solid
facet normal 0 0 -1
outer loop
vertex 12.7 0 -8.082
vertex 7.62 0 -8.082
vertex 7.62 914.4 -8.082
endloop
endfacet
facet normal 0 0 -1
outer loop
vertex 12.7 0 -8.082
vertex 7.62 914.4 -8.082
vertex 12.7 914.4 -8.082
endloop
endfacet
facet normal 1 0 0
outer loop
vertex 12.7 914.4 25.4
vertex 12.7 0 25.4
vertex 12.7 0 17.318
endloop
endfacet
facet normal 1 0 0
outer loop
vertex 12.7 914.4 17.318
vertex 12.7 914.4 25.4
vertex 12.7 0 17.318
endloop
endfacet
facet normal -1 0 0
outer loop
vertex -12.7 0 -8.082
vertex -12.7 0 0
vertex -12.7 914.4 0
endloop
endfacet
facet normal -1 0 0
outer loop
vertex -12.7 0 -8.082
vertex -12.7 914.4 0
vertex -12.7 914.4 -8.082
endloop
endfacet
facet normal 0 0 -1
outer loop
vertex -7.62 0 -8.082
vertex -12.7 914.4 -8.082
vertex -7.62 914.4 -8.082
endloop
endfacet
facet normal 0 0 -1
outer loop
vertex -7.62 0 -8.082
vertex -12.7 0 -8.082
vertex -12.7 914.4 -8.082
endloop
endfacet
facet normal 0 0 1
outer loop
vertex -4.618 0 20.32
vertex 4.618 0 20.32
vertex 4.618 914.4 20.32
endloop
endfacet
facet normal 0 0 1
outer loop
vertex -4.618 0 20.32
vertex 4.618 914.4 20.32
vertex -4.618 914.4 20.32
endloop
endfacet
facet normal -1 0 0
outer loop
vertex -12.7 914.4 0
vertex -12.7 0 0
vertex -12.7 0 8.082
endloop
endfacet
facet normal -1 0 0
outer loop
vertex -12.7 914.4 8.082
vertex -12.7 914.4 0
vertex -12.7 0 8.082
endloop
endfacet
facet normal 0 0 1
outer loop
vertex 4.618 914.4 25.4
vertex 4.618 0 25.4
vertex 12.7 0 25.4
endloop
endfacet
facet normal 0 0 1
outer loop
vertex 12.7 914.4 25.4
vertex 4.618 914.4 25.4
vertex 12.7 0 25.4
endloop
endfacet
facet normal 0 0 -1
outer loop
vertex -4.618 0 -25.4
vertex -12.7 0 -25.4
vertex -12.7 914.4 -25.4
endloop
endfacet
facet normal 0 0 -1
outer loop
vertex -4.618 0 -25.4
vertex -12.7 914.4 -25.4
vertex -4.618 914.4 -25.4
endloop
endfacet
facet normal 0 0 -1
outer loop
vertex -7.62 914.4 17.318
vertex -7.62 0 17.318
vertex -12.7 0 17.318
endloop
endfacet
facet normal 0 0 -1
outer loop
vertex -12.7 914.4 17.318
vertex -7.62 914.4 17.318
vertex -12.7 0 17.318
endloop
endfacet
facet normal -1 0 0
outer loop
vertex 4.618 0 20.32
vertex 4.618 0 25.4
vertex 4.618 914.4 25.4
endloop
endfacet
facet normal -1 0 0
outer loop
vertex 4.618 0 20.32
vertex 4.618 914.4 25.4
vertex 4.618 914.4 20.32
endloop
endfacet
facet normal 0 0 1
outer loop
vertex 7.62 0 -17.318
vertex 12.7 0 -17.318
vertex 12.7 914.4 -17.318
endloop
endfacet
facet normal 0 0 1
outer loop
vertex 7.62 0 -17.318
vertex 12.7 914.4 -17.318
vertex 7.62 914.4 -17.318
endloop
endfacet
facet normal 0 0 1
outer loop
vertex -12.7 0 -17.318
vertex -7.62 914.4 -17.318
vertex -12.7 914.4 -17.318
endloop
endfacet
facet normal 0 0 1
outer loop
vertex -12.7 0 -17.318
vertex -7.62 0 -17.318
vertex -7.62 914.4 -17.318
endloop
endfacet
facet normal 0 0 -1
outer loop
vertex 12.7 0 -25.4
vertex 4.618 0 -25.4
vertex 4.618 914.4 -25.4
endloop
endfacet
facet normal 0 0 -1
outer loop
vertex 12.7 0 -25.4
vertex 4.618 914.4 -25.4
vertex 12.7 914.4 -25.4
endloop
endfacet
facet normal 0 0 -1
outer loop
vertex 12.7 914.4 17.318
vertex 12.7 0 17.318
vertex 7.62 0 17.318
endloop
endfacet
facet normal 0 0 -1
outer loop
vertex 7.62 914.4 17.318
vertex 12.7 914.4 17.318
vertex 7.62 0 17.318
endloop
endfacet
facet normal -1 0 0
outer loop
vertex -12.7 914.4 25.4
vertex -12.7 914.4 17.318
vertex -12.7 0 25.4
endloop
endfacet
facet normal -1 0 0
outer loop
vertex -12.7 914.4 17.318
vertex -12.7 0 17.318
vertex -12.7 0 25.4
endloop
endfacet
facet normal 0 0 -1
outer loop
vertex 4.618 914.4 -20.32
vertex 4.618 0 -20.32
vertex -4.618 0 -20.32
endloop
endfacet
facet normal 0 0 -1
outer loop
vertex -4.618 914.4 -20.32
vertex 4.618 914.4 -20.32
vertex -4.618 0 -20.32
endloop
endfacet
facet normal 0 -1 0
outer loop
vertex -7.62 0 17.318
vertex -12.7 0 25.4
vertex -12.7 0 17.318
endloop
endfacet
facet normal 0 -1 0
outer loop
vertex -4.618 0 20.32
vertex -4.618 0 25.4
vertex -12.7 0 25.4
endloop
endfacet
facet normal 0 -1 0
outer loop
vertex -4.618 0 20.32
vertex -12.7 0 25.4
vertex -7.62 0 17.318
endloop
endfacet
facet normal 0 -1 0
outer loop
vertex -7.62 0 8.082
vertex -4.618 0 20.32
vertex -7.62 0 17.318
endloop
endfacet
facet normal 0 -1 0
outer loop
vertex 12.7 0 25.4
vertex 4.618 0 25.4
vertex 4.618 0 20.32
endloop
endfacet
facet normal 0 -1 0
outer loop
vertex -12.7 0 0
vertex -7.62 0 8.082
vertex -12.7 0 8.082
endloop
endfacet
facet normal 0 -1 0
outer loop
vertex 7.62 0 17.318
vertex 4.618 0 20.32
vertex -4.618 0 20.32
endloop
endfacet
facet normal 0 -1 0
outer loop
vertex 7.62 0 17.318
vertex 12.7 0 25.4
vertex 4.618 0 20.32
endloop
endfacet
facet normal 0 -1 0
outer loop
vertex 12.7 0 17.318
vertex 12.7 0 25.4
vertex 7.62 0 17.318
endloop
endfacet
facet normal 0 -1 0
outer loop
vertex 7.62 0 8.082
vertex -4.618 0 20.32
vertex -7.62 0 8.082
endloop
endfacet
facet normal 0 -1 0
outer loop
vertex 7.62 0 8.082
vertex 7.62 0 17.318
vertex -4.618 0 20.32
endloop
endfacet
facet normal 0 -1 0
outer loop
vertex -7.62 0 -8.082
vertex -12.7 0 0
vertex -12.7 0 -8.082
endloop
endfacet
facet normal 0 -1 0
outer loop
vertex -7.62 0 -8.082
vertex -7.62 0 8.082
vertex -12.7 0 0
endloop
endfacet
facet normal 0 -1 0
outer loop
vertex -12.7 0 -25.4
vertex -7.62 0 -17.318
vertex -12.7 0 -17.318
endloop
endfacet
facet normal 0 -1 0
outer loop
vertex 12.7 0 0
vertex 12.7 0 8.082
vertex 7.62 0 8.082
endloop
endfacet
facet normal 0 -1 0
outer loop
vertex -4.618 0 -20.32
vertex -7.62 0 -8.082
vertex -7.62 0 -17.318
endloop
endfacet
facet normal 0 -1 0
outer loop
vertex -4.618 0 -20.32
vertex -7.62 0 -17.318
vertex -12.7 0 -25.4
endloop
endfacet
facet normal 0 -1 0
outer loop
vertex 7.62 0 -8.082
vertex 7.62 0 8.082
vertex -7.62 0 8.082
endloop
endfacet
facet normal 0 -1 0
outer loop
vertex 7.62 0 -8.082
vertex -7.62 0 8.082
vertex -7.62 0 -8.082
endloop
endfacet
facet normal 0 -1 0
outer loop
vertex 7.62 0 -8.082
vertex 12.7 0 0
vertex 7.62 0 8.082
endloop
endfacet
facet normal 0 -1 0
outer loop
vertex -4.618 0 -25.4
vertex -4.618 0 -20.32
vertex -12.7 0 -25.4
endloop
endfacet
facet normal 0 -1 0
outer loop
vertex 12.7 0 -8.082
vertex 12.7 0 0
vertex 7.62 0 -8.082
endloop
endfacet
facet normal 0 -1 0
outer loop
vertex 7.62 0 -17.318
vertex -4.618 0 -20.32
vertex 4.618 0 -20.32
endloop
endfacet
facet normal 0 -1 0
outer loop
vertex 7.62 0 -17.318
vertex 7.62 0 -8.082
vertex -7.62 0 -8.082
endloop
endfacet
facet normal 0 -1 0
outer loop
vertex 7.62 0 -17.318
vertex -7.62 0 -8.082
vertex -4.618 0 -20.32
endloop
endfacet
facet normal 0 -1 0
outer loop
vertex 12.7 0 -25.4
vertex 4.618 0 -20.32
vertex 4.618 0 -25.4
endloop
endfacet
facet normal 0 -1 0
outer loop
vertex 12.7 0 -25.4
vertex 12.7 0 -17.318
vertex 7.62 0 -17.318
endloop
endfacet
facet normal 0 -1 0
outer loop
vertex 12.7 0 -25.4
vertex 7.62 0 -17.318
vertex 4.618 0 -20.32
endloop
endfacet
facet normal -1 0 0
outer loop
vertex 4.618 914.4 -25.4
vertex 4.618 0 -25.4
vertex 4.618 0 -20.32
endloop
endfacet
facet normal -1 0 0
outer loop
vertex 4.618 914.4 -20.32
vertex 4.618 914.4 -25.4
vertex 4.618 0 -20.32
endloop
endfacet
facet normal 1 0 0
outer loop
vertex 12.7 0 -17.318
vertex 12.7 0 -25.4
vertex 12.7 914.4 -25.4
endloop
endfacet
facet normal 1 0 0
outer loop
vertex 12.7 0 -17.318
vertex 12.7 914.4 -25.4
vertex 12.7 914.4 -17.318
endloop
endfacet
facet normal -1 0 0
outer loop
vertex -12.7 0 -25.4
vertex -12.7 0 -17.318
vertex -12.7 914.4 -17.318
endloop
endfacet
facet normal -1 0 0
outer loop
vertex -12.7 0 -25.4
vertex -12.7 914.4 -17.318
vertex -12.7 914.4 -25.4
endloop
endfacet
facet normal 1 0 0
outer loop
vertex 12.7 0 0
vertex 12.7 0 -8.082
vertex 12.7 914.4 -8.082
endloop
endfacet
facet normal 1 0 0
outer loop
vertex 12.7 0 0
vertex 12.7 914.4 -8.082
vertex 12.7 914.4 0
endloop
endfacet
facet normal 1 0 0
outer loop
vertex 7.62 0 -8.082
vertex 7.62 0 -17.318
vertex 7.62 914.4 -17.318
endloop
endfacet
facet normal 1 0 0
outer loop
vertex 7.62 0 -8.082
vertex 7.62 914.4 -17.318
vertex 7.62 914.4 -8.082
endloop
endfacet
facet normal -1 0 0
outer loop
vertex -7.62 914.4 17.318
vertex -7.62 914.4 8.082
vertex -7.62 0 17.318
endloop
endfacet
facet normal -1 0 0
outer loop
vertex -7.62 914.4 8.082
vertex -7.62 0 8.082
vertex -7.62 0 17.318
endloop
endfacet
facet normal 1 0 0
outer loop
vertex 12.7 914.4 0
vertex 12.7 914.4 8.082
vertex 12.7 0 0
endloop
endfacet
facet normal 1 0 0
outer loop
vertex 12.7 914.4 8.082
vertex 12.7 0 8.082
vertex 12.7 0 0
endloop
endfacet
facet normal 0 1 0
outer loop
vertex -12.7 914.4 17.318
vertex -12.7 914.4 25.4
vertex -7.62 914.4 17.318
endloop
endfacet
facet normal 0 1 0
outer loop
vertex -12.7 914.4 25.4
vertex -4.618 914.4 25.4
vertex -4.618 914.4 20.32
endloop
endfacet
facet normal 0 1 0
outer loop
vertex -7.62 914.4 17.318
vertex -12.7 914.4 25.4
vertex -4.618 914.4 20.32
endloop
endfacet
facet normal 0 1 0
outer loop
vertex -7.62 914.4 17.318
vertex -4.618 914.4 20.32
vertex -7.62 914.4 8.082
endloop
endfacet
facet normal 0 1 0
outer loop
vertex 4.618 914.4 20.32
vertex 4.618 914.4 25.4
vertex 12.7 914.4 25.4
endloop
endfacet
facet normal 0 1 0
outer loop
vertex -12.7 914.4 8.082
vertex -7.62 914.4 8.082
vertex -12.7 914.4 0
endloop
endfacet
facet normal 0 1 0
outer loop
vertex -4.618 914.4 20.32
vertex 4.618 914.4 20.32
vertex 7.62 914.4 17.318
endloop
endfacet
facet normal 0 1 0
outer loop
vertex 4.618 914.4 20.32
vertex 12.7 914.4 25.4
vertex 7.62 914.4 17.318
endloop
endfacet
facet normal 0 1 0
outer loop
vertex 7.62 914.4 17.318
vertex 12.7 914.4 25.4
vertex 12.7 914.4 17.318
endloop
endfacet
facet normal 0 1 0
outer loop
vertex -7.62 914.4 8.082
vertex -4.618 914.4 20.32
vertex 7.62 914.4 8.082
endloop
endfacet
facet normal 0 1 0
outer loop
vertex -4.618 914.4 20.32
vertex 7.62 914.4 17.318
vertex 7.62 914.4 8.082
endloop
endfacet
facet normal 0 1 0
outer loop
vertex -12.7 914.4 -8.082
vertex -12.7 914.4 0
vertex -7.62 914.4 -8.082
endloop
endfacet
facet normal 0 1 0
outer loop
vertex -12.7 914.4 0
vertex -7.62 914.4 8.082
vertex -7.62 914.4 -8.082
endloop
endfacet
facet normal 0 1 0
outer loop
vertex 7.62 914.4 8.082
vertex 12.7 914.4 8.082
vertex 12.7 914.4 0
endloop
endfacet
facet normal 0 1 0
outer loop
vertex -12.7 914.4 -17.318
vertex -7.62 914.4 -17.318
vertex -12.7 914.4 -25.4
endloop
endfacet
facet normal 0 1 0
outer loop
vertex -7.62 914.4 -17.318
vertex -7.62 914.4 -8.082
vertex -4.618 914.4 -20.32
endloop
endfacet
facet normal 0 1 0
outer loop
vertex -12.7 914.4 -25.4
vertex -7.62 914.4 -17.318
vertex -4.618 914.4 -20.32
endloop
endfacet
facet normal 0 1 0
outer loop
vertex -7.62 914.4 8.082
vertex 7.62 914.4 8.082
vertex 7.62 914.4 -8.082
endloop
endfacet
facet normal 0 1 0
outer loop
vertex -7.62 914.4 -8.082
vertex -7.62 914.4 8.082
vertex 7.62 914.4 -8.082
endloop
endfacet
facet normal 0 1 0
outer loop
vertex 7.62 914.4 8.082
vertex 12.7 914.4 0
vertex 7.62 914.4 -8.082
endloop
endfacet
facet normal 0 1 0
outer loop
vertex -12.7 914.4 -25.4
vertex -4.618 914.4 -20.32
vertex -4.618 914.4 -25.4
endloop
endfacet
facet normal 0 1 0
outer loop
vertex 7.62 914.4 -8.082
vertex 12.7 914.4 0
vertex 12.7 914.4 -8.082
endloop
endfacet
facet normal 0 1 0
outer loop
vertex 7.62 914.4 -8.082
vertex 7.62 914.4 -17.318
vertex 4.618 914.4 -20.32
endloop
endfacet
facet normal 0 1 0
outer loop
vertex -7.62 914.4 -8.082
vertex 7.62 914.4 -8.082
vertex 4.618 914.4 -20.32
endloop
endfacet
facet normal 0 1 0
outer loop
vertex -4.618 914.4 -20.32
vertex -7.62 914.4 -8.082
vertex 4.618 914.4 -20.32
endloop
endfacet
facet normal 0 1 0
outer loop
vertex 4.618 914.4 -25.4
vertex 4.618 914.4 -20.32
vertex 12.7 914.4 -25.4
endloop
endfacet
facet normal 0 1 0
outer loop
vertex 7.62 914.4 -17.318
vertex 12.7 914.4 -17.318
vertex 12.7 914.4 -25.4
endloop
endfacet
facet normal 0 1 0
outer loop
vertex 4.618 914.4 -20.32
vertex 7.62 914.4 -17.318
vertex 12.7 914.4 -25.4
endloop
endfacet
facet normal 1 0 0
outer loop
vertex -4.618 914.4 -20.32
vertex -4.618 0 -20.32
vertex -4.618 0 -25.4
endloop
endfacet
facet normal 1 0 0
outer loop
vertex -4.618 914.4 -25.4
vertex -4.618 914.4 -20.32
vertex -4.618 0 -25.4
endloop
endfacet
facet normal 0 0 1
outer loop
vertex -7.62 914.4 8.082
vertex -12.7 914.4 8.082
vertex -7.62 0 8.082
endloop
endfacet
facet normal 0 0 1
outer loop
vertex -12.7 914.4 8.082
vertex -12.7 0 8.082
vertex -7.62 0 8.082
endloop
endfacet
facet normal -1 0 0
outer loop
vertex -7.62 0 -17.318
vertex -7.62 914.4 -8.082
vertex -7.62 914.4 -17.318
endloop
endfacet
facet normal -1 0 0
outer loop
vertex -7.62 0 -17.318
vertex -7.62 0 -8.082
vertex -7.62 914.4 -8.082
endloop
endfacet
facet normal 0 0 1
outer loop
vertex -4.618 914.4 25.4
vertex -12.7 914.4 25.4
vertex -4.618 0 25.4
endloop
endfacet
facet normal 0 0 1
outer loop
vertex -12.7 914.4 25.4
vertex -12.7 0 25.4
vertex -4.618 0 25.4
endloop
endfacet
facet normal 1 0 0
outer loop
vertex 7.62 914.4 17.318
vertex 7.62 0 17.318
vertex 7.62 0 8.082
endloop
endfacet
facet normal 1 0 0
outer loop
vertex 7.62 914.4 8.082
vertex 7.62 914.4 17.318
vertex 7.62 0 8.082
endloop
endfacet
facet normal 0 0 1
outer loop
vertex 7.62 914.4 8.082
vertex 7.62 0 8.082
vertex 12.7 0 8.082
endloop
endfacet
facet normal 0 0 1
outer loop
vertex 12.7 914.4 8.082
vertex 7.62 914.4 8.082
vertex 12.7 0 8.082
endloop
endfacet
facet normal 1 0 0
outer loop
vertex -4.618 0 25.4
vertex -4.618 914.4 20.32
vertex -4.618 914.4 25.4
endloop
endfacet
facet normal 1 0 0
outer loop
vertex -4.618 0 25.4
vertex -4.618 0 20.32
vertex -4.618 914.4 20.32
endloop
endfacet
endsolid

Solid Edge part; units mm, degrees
sketch "Sketch1" plane through (0, 0, 0) normal (0, -1, 0) x (1, 0, 0)
  line L0 (-7.62, -8.0821) -> (-7.62, -17.3179)
  line L1 (-7.62, -17.3179) -> (-12.7, -17.3179)
  line L2 (-12.7, -17.3179) -> (-12.7, -25.4)
  line L3 (-12.7, -25.4) -> (-4.6179, -25.4)
  line L4 (-4.6179, -20.32) -> (-4.6179, -25.4)
  line L5 (4.6179, -20.32) -> (-4.6179, -20.32)
  line L6 (4.6179, -25.4) -> (4.6179, -20.32)
  line L7 (4.6179, -25.4) -> (12.7, -25.4)
  line L8 (12.7, -25.4) -> (12.7, -17.3179)
  line L9 (12.7, -17.3179) -> (7.62, -17.3179)
  line L10 (7.62, -17.3179) -> (7.62, -8.0821)
  line L11 (7.62, -8.0821) -> (12.7, -8.0821)
  line L12 (12.7, -8.0821) -> (12.7, 0)
  line L13 (12.7, 8.0821) -> (12.7, 0)
  line L14 (7.62, 8.0821) -> (12.7, 8.0821)
  line L15 (7.62, 17.3179) -> (7.62, 8.0821)
  line L16 (12.7, 17.3179) -> (7.62, 17.3179)
  line L17 (12.7, 25.4) -> (12.7, 17.3179)
  line L18 (4.6179, 25.4) -> (12.7, 25.4)
  line L19 (4.6179, 25.4) -> (4.6179, 20.32)
  line L20 (4.6179, 20.32) -> (-4.6179, 20.32)
  line L21 (-4.6179, 20.32) -> (-4.6179, 25.4)
  line L22 (-12.7, 25.4) -> (-4.6179, 25.4)
  line L23 (-12.7, 17.3179) -> (-12.7, 25.4)
  line L24 (-7.62, 17.3179) -> (-12.7, 17.3179)
  line L25 (-7.62, 8.0821) -> (-7.62, 17.3179)
  line L26 (-12.7, 8.0821) -> (-7.62, 8.0821)
  line L27 (-12.7, 0) -> (-12.7, 8.0821)
  line L28 (-12.7, 0) -> (-12.7, -8.0821)
  line L29 (-12.7, -8.0821) -> (-7.62, -8.0821)
extrude "Protrusion1" add sketch "Sketch1" against normal blind 914.4
